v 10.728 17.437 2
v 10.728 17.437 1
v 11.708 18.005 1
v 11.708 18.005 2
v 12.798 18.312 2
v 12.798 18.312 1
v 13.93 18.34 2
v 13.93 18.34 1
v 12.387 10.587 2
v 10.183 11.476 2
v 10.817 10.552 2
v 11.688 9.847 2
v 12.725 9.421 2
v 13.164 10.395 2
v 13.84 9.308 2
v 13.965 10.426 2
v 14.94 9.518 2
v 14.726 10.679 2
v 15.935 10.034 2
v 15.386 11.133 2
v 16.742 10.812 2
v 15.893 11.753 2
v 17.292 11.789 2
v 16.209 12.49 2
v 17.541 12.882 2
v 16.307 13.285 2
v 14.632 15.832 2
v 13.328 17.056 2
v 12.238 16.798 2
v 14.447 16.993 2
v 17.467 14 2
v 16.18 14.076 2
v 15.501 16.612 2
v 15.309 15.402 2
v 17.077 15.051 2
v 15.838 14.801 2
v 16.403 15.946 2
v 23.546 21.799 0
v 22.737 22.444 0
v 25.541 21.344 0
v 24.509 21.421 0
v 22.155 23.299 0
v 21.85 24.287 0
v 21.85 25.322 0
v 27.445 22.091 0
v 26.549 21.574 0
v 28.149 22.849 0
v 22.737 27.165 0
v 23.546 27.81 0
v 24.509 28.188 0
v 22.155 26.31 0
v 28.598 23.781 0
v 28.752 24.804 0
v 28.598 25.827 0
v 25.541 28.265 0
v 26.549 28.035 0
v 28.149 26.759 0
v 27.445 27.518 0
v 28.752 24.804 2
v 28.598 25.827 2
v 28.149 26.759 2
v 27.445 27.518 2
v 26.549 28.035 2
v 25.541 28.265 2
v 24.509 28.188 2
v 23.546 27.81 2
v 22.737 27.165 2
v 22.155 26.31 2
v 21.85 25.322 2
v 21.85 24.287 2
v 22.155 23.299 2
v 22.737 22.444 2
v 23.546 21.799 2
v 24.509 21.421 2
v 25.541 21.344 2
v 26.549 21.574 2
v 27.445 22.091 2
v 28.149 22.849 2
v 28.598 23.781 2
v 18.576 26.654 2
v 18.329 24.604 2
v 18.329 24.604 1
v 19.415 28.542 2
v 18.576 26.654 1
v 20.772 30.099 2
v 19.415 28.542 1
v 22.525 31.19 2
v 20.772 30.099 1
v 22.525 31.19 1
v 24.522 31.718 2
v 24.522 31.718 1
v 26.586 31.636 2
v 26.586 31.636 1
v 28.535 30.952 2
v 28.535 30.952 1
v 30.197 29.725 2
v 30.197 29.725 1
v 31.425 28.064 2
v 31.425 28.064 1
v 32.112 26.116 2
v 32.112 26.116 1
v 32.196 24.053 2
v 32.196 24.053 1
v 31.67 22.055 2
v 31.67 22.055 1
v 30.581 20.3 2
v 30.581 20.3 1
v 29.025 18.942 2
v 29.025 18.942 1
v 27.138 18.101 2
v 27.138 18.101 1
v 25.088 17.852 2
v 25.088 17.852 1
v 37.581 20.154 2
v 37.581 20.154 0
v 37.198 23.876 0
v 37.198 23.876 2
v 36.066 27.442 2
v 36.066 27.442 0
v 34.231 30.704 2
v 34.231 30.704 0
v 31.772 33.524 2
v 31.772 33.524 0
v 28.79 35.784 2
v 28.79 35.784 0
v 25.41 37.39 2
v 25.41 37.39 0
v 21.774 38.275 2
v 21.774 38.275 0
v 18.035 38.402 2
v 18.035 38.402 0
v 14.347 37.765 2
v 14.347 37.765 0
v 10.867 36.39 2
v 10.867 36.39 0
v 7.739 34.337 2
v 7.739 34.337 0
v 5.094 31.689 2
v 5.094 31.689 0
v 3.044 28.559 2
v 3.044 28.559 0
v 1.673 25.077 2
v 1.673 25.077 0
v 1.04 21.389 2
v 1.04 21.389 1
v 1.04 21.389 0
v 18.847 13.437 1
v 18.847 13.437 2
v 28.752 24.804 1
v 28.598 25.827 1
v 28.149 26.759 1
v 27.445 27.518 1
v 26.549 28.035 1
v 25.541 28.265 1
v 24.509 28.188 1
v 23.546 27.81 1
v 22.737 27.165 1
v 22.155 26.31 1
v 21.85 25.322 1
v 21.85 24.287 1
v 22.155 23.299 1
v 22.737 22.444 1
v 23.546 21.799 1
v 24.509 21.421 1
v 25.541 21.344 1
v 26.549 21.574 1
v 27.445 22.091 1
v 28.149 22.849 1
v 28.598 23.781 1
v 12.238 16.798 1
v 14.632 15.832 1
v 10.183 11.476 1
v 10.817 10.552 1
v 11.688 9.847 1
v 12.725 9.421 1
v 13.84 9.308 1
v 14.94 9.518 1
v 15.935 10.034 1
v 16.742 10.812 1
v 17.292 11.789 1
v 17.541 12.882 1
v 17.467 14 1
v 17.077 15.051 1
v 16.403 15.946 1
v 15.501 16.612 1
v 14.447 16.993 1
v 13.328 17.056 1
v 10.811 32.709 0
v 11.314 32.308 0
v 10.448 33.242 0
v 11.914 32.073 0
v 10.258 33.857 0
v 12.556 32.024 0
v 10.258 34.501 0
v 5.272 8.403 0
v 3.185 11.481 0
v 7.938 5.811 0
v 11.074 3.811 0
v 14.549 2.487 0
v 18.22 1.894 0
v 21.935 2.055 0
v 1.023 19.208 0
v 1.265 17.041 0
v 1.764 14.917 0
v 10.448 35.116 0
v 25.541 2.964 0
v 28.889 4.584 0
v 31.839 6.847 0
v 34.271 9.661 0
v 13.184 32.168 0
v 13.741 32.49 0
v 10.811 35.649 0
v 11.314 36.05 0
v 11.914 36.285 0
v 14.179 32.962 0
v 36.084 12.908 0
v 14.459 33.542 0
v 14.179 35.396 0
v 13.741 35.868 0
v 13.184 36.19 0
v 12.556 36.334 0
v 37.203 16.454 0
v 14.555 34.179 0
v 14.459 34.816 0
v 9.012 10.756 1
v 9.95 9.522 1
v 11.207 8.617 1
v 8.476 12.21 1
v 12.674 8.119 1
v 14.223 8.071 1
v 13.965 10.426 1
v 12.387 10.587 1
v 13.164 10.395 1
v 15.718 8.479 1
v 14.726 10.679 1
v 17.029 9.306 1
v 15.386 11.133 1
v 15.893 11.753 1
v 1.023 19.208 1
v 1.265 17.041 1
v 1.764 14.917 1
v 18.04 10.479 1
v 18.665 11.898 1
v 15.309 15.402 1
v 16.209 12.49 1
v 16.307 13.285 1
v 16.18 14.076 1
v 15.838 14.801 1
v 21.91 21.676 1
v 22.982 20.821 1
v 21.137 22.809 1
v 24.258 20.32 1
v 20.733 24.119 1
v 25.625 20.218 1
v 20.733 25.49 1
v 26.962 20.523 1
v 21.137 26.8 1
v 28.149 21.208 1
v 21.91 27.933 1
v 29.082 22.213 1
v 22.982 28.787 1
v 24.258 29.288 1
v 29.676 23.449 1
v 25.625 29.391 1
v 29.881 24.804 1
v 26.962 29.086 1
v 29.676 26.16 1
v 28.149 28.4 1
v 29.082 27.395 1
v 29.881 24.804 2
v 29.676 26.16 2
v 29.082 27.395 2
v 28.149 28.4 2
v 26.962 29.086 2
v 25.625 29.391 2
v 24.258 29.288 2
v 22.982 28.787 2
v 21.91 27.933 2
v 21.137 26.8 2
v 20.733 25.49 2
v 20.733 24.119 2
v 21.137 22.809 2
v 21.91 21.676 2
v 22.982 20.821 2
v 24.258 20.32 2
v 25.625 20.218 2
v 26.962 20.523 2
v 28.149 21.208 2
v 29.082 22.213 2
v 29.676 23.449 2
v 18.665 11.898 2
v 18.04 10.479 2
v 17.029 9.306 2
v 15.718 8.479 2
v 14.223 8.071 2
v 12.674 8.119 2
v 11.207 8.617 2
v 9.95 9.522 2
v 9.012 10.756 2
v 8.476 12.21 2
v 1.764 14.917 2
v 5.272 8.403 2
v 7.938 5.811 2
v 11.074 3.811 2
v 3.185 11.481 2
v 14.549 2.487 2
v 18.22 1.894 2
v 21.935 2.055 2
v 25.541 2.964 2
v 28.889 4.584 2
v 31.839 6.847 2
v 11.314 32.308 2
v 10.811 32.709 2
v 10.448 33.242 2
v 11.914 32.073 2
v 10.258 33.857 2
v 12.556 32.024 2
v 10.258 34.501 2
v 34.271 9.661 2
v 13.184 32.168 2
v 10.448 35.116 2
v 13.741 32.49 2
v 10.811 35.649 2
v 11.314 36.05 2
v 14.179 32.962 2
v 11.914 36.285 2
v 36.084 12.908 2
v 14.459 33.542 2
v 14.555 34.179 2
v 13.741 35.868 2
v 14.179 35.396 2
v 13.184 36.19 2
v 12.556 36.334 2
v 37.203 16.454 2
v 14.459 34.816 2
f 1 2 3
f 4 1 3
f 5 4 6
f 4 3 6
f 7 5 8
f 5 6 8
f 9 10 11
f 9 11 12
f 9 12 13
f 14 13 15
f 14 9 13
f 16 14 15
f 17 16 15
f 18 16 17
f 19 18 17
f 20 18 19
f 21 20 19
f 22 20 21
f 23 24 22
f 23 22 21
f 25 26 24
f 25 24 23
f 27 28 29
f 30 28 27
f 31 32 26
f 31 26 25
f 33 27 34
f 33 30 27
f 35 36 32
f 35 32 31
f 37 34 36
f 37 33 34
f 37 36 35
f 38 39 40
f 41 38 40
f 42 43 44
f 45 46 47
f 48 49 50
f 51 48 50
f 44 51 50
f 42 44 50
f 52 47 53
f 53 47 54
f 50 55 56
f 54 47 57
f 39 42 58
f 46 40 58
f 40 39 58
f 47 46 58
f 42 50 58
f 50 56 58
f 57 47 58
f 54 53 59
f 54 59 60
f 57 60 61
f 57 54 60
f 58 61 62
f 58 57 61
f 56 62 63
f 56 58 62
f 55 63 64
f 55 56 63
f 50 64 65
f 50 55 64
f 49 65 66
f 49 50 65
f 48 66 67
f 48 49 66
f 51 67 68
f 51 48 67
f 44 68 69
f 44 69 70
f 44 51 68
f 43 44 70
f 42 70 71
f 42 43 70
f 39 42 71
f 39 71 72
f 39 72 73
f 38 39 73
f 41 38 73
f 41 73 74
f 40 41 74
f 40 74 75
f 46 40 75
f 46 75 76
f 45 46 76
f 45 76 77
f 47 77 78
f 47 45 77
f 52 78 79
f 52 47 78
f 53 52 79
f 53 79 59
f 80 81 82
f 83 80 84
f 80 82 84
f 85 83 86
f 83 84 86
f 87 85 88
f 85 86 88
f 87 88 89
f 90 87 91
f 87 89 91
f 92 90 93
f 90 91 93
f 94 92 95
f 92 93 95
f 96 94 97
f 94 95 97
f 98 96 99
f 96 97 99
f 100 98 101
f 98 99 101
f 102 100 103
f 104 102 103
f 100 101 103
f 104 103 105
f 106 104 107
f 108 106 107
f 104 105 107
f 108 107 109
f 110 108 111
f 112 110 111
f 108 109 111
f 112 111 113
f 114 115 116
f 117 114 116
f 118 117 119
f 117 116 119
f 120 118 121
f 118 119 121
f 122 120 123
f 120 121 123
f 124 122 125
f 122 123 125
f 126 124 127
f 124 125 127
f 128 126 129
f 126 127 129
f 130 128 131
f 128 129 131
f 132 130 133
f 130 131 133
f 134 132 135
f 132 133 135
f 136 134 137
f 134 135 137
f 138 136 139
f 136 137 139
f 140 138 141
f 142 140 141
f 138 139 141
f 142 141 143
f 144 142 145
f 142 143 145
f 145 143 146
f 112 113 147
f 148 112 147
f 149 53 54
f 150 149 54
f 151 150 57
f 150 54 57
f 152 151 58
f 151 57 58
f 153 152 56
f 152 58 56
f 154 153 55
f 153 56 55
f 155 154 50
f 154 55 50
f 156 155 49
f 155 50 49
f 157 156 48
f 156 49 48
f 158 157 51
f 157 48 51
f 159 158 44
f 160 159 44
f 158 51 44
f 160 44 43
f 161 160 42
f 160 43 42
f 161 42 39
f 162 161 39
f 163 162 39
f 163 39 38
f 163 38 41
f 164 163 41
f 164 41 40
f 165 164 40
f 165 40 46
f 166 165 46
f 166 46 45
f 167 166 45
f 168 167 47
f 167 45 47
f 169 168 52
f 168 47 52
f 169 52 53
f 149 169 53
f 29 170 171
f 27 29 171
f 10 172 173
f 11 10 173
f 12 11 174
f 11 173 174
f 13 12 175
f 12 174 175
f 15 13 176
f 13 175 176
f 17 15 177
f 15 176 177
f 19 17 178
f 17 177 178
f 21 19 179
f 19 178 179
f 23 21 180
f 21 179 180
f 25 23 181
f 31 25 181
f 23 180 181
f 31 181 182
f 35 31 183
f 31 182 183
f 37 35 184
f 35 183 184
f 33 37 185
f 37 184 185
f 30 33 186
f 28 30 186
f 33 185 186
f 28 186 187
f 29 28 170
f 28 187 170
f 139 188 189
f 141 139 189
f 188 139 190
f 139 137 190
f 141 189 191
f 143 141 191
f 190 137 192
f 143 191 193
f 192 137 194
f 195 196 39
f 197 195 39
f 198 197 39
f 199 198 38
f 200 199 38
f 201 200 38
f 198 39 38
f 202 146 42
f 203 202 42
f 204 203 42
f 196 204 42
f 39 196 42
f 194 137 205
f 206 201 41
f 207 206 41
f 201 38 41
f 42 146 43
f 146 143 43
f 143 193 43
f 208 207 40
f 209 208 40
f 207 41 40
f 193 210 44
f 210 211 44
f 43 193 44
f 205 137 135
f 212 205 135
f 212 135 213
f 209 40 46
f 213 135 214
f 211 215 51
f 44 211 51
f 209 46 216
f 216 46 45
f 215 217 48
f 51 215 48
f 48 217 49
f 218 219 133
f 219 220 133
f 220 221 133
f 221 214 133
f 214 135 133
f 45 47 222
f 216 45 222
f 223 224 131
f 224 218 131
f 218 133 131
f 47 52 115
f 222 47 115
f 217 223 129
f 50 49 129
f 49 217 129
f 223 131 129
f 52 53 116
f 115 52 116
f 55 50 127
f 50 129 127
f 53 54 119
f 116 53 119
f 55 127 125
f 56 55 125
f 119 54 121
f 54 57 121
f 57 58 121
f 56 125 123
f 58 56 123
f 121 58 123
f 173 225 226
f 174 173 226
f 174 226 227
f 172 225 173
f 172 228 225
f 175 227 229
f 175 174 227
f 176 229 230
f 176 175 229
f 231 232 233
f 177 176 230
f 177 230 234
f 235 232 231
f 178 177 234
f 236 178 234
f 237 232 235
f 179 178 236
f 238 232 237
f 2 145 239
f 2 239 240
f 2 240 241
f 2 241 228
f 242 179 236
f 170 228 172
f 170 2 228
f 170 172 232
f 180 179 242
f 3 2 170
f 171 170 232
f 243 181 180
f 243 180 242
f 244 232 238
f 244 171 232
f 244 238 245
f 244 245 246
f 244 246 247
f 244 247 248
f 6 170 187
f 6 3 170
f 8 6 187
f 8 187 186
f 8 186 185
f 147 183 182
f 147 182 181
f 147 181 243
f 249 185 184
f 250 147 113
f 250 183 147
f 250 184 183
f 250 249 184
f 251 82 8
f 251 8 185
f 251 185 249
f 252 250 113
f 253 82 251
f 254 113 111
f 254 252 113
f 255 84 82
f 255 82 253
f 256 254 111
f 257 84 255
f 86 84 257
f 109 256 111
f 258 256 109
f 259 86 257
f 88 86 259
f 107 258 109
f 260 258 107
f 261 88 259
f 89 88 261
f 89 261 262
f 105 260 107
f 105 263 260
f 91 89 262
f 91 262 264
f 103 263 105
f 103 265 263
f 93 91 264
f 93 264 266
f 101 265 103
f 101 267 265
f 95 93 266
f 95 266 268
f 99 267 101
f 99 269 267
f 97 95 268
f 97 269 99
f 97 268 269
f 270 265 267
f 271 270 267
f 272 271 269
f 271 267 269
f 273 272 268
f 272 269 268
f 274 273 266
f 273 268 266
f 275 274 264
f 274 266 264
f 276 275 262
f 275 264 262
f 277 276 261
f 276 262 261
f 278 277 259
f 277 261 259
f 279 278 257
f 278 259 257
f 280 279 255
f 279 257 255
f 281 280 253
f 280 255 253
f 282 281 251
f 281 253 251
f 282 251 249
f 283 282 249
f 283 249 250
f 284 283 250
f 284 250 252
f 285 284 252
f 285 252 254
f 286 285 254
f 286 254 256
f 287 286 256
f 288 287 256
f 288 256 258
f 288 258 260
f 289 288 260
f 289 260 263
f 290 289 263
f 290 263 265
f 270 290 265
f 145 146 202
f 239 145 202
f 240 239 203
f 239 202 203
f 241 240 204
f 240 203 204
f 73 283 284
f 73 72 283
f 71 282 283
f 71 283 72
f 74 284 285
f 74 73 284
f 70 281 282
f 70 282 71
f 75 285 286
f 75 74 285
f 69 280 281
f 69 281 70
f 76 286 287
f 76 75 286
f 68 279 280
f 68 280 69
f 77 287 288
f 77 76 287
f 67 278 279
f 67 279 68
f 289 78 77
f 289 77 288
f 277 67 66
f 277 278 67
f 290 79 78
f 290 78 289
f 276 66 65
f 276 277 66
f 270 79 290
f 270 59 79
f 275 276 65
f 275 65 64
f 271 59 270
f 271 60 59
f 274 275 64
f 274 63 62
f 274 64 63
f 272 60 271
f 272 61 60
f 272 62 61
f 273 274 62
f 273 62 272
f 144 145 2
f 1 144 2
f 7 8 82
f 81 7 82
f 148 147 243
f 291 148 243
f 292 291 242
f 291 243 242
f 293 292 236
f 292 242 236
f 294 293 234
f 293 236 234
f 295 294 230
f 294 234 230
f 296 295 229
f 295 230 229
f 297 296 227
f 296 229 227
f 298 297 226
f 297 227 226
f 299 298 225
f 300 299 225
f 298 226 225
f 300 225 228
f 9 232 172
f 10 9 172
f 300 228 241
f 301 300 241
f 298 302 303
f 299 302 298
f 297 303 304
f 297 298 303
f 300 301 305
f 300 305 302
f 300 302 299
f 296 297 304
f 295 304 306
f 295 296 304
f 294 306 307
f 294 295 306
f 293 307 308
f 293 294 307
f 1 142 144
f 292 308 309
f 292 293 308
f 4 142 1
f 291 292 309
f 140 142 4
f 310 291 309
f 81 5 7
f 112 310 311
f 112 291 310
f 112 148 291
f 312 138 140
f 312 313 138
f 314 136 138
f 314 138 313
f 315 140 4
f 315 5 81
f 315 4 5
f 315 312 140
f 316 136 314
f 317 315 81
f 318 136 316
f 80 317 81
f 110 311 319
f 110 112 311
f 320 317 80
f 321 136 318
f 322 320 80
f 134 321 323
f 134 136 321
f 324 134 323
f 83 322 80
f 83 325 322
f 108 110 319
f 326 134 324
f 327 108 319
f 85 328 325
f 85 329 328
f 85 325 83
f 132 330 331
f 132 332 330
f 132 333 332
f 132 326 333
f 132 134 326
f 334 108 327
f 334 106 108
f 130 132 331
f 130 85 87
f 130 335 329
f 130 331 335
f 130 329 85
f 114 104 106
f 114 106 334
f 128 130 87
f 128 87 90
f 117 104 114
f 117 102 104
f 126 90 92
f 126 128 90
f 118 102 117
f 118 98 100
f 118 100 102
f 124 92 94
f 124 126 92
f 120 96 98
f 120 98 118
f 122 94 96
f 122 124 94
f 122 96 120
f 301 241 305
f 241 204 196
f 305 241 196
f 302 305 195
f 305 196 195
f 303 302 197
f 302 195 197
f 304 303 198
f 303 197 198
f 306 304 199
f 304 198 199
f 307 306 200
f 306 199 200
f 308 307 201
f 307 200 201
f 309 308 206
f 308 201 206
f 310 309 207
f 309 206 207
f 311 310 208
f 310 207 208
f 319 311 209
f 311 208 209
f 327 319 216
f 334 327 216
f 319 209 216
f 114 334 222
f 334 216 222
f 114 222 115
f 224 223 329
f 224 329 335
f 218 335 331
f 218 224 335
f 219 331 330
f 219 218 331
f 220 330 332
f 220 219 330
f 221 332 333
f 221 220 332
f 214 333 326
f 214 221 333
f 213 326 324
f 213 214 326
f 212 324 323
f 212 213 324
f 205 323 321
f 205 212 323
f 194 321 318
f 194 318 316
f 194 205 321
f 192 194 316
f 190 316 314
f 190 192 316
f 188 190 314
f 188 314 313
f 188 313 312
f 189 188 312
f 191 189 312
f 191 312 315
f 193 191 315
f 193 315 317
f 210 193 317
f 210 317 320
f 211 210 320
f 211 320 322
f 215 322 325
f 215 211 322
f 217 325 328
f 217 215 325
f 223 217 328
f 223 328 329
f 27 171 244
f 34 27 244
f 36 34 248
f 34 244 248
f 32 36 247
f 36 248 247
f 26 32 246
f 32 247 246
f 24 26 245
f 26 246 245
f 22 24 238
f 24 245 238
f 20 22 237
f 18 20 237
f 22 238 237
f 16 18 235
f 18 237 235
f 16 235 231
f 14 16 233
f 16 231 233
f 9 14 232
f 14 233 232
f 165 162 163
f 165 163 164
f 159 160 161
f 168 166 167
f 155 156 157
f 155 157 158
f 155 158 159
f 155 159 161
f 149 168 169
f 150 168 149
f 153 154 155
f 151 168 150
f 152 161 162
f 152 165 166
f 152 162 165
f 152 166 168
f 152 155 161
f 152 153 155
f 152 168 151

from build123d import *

# Parameters (mm, degrees)
F0_R     = 2.160588797
F1_DEPTH = 2
F0_R_2   = 4.5994043898
F2_DEPTH = 1
F0_R_3   = 3.4704819518
F3_DEPTH = 2


with BuildPart() as f1:
    # F0 (on Top) → F1 (new body)
    with BuildSketch(Plane.XY):
        with BuildLine():
            ThreePointArc((1.7638206969, 14.9172360687), (21.9354642074, 2.0549303863), (37.5805657932, 20.153684646))
            ThreePointArc((37.5805657932, 20.153684646), (19.9076326038, 38.4343937698), (1.0400371472, 21.3894316028))
            Line((1.0400371472, 21.3894316028), (10.7278591022, 17.4368359149))
            ThreePointArc((10.7278591022, 17.4368359149), (12.2433572681, 18.1926988563), (13.9304762706, 18.3399841189))
            Line((13.9304762706, 18.3399841189), (18.3288846165, 24.6035046875))
            ThreePointArc((18.3288846165, 24.6035046875), (30.1969763648, 29.7250639334), (25.0878613442, 17.8516097367))
            Line((25.0878613442, 17.8516097367), (18.846578896, 13.4367663413))
            ThreePointArc((18.846578896, 13.4367663413), (14.2233775819, 8.0711257596), (8.475728333, 12.2097991407))
            Line((8.475728333, 12.2097991407), (1.7638206969, 14.9172360687))
        make_face()
        with Locations((12.3943258077, 34.1789796948)):
            Circle(F0_R, mode=Mode.SUBTRACT)
    extrude(amount=F1_DEPTH)

    # F0 (on Top) → F2 (join)
    with BuildSketch(Plane.XY):
        with BuildLine():
            Line((10.7278591022, 17.4368359149), (1.0400371472, 21.3894316028))
            ThreePointArc((1.0400371472, 21.3894316028), (1.1115578041, 18.1208617268), (1.7638206969, 14.9172360687))
            Line((1.7638206969, 14.9172360687), (8.475728333, 12.2097991407))
            ThreePointArc((8.475728333, 12.2097991407), (14.2233775819, 8.0711257596), (18.846578896, 13.4367663413))
            Line((18.846578896, 13.4367663413), (25.0878613442, 17.8516097367))
            ThreePointArc((25.0878613442, 17.8516097367), (30.1969763648, 29.7250639334), (18.3288846165, 24.6035046875))
            Line((18.3288846165, 24.6035046875), (13.9304762706, 18.3399841189))
            ThreePointArc((13.9304762706, 18.3399841189), (12.2433572681, 18.1926988563), (10.7278591022, 17.4368359149))
        make_face()
        with BuildLine():
            ThreePointArc((12.2377891093, 16.798093915), (17.2918950944, 11.788760985), (10.1827690378, 11.476142332))
            Line((10.1827690378, 11.476142332), (12.3866147391, 10.587159116))
            ThreePointArc((12.3866147391, 10.587159116), (16.0771253181, 12.1102243495), (14.6324749478, 15.8321299564))
            Line((14.6324749478, 15.8321299564), (12.2377891093, 16.798093915))
        make_face(mode=Mode.SUBTRACT)
        with Locations((25.2813615695, 24.8042933578)):
            Circle(F0_R_2, mode=Mode.SUBTRACT)
    extrude(amount=F2_DEPTH)

    # F0 (on Top) → F3 (join)
    with BuildSketch(Plane.XY):
        with BuildLine():
            Line((12.3866147391, 10.587159116), (10.1827690378, 11.476142332))
            ThreePointArc((10.1827690378, 11.476142332), (17.2918950944, 11.788760985), (12.2377891093, 16.798093915))
            Line((12.2377891093, 16.798093915), (14.6324749478, 15.8321299564))
            ThreePointArc((14.6324749478, 15.8321299564), (16.0771253181, 12.1102243495), (12.3866147391, 10.587159116))
        make_face()
        with Locations((25.2813615695, 24.8042933578)):
            Circle(F0_R_2)
        with Locations((25.2813615695, 24.8042933578)):
            Circle(F0_R_3, mode=Mode.SUBTRACT)
    extrude(amount=F3_DEPTH)


with BuildPart() as f2:
    # F0 (on Top) → F2, piece 2 (new body)
    with BuildSketch(Plane.XY):
        with Locations((25.2813615695, 24.8042933578)):
            Circle(F0_R_3)
    extrude(amount=F2_DEPTH)


solid = Compound([f1.part, f2.part])
